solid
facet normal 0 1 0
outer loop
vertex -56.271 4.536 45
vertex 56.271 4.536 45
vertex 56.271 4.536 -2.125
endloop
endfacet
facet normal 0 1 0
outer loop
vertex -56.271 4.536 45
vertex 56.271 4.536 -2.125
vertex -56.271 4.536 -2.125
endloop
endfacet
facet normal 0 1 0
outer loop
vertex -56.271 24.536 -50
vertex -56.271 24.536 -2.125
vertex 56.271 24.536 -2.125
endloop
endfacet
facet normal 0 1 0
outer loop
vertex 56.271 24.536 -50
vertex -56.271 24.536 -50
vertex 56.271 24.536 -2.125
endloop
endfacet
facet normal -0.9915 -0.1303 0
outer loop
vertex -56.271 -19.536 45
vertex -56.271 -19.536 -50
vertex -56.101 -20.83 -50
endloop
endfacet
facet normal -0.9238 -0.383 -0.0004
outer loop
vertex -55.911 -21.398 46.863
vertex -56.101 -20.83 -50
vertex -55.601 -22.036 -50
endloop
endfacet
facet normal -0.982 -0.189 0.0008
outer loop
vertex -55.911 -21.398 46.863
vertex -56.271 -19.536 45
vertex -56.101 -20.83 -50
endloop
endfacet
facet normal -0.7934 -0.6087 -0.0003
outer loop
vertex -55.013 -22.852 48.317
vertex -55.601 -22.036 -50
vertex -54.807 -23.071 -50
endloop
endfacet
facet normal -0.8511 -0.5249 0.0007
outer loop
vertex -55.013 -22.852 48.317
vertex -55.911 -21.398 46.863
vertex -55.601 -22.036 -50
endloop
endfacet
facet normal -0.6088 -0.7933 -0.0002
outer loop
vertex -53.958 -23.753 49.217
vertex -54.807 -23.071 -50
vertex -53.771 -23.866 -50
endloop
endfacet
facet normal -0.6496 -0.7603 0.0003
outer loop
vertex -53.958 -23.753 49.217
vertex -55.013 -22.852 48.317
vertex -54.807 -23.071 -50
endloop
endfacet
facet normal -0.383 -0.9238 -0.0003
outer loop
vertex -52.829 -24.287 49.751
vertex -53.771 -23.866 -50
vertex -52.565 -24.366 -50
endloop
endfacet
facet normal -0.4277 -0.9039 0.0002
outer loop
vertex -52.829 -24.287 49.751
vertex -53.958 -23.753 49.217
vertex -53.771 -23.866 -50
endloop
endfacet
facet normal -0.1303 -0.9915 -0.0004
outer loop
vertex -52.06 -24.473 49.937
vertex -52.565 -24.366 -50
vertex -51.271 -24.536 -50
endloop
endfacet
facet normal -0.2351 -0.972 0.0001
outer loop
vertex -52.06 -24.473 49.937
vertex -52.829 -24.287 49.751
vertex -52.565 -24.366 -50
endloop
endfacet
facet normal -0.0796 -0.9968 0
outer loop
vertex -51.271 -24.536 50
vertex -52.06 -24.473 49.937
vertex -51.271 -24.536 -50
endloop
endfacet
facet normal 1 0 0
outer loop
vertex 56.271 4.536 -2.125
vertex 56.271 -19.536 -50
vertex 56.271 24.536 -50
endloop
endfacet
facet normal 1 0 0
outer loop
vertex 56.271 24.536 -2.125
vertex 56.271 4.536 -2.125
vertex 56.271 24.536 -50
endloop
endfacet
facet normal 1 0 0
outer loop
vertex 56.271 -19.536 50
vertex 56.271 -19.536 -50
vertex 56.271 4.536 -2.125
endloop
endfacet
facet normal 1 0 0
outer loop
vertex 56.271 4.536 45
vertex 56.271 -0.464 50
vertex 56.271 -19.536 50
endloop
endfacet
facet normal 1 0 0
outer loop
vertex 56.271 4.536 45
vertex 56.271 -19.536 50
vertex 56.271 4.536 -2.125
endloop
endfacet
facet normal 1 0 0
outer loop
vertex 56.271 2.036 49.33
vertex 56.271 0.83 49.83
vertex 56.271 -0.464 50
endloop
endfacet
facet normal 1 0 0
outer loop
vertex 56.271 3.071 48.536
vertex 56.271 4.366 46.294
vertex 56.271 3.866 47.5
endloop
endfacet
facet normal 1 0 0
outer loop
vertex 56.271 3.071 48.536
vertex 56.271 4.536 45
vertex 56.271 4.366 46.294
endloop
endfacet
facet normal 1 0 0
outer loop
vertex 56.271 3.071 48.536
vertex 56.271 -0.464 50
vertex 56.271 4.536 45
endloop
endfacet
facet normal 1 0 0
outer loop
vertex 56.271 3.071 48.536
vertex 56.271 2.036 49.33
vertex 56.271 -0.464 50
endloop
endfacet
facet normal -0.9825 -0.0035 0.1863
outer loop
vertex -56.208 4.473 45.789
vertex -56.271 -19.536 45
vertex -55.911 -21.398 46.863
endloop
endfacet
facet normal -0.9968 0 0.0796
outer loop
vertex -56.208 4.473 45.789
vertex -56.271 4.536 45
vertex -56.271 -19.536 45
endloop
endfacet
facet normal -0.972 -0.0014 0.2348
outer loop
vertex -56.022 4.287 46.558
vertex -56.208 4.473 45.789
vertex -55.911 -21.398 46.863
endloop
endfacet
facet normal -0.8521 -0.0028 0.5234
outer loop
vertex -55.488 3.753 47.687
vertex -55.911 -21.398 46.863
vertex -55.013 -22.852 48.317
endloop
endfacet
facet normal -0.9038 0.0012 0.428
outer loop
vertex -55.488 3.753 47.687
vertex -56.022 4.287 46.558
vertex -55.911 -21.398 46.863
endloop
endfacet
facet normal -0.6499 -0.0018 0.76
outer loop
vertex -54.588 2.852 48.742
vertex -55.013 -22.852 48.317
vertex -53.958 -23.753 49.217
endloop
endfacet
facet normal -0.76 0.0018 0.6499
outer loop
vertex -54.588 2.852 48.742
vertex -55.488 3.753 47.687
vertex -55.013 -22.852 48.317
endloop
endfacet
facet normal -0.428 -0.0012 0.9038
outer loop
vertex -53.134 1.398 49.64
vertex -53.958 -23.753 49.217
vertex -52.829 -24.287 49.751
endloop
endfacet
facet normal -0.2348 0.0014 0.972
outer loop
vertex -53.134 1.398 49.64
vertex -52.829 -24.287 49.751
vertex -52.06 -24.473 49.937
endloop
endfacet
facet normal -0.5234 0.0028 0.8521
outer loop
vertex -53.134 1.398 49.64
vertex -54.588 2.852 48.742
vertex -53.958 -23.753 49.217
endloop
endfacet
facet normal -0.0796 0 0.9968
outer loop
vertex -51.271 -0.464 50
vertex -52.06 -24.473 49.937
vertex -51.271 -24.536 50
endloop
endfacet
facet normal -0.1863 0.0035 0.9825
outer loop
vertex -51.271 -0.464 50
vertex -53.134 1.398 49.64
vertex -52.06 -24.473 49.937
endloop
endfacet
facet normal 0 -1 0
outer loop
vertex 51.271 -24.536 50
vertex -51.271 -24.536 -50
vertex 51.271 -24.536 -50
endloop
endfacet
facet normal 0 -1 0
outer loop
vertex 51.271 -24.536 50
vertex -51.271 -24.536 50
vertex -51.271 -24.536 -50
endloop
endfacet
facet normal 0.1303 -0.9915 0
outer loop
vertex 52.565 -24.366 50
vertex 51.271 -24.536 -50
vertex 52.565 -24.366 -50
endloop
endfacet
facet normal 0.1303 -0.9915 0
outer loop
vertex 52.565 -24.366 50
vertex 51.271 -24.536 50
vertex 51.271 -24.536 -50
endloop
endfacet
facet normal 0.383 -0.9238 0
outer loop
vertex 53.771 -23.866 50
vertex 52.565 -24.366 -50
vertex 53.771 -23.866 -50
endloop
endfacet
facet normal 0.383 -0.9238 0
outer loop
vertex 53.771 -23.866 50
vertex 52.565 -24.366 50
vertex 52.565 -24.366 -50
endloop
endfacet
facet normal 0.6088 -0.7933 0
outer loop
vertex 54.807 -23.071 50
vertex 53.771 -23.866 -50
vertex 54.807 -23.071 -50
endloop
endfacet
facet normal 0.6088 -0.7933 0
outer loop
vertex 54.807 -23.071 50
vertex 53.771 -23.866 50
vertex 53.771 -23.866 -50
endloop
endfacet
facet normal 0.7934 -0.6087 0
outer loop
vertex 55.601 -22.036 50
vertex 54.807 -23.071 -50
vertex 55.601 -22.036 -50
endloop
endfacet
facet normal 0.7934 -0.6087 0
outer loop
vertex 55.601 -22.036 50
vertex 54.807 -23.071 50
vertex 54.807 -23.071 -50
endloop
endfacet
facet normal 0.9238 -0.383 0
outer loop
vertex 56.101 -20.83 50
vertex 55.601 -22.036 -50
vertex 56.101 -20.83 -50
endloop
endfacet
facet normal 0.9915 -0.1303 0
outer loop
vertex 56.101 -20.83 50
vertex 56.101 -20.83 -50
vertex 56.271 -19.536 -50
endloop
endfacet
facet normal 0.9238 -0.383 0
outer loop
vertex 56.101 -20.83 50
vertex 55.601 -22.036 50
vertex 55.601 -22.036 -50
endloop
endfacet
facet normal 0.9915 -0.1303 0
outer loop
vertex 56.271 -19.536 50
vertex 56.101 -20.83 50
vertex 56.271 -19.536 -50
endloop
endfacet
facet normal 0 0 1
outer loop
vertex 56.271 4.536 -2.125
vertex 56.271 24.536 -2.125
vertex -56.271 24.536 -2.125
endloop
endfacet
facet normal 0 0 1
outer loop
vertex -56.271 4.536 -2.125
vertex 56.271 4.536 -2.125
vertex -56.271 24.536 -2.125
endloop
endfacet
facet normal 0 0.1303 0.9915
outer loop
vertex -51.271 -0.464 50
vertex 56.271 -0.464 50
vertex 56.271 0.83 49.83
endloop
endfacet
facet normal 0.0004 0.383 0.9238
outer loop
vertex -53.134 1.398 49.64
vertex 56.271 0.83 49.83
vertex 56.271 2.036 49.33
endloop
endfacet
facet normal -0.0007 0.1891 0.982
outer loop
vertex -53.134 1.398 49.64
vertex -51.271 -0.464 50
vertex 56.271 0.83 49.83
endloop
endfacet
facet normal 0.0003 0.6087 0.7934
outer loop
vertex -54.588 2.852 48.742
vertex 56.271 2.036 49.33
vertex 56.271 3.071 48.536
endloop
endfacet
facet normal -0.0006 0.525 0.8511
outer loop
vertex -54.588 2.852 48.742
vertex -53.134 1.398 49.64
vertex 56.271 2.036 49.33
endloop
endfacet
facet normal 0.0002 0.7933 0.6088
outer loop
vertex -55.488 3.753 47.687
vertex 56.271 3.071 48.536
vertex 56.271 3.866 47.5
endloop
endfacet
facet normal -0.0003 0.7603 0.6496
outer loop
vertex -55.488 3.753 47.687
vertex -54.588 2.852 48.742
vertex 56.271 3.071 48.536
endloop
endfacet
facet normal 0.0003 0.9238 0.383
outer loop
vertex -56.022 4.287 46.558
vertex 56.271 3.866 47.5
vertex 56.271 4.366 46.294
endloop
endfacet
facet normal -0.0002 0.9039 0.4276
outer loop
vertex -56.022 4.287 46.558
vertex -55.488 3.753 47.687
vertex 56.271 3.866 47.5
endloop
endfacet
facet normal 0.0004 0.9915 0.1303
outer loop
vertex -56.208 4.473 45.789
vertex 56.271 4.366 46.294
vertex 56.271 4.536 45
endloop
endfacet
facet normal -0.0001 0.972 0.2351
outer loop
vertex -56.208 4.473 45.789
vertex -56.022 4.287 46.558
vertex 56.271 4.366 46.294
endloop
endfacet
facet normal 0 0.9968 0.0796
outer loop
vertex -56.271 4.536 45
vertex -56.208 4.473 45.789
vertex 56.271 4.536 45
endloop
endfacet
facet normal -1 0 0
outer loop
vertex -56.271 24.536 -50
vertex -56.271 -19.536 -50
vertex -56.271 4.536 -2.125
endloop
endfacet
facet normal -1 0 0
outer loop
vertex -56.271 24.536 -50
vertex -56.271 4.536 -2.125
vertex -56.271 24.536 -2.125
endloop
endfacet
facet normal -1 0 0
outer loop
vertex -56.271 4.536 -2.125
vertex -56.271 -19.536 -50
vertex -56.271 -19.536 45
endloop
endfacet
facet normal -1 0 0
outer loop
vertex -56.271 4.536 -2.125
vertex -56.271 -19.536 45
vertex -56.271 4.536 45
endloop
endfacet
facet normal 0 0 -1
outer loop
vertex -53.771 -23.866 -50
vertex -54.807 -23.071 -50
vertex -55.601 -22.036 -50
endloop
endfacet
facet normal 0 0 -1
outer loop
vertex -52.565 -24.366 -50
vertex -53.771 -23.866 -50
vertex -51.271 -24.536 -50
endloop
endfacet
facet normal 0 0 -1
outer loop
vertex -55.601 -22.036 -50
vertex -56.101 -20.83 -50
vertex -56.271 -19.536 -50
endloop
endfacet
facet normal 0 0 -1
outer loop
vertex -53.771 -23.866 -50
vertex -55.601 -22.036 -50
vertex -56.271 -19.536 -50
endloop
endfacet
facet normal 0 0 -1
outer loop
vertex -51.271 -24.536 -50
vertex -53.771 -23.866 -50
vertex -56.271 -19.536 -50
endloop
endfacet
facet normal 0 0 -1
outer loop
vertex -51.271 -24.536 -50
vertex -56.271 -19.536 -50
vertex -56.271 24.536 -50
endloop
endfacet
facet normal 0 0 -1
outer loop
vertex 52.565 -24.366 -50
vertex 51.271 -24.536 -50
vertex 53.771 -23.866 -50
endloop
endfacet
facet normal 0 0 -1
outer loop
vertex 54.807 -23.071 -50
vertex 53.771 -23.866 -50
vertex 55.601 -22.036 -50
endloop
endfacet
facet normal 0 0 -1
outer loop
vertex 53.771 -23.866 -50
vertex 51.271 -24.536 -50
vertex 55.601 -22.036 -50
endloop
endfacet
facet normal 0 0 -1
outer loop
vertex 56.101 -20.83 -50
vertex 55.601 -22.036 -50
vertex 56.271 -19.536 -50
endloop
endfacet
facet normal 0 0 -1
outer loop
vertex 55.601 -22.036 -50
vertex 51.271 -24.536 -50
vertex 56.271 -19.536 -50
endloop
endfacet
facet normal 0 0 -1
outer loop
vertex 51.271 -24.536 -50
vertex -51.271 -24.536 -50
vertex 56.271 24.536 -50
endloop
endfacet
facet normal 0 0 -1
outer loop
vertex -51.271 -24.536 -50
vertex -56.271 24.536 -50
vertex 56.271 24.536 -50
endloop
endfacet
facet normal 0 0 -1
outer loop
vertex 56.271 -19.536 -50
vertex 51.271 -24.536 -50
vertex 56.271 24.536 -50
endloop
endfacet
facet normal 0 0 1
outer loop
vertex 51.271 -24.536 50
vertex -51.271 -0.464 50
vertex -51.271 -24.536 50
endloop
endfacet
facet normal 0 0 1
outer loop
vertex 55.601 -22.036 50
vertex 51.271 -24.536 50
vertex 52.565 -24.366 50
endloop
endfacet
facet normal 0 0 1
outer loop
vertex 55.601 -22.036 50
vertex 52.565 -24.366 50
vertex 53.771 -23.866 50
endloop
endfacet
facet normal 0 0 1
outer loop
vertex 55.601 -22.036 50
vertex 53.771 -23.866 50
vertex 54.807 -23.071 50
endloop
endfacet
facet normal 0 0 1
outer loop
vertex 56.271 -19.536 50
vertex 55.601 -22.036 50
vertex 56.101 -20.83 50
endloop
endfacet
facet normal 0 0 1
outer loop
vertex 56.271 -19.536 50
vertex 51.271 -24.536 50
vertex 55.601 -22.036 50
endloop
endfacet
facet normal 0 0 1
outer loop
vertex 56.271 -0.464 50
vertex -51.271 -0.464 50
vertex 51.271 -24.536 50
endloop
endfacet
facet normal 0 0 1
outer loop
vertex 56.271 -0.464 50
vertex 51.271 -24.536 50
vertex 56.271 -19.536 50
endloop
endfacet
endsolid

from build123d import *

# Parameters (mm, degrees)
F0_W     = 112.5419810414
F0_H     = 49.071829766
F1_DEPTH = 50
F2_DEPTH = 50
F3_W     = 112.5419810414
F3_H     = 5.3821941838
F3_H_2   = 46.7423561029
F4_DEPTH = 20
F5_R     = 5


with BuildPart() as f1:
    # F0 (on Top) → F1 (new body)
    with BuildSketch(Plane.XY):
        Rectangle(F0_W, F0_H)
    extrude(amount=F1_DEPTH)

    # F2 (add): a face of the model
    f2_faces = [f1.faces().sort_by_distance(p)[0] for p in [
        (0, 0, 0),
    ]]
    extrude(f2_faces, amount=F2_DEPTH)

    # F3 (on face) → F4 (cut)
    with BuildSketch(Plane(origin=(0, 24.535914883, 0), x_dir=(-1, 0, 0), z_dir=(0, 1, 0))):
        with Locations((0, 0.5665468052)):
            Rectangle(F3_W, F3_H)
        with Locations((0, 26.6288219485)):
            Rectangle(F3_W, F3_H_2)
    extrude(amount=-F4_DEPTH, mode=Mode.SUBTRACT)

    # F5
    f5_edges = [f1.edges().sort_by_distance(p)[0] for p in [
        (0, 4.535915, 50),
        (-56.270991, -10, 50),
        (56.270991, -24.535915, 0),
        (-56.270991, -24.535915, 0),
    ]]
    fillet(f5_edges, radius=F5_R)


solid = f1.part
